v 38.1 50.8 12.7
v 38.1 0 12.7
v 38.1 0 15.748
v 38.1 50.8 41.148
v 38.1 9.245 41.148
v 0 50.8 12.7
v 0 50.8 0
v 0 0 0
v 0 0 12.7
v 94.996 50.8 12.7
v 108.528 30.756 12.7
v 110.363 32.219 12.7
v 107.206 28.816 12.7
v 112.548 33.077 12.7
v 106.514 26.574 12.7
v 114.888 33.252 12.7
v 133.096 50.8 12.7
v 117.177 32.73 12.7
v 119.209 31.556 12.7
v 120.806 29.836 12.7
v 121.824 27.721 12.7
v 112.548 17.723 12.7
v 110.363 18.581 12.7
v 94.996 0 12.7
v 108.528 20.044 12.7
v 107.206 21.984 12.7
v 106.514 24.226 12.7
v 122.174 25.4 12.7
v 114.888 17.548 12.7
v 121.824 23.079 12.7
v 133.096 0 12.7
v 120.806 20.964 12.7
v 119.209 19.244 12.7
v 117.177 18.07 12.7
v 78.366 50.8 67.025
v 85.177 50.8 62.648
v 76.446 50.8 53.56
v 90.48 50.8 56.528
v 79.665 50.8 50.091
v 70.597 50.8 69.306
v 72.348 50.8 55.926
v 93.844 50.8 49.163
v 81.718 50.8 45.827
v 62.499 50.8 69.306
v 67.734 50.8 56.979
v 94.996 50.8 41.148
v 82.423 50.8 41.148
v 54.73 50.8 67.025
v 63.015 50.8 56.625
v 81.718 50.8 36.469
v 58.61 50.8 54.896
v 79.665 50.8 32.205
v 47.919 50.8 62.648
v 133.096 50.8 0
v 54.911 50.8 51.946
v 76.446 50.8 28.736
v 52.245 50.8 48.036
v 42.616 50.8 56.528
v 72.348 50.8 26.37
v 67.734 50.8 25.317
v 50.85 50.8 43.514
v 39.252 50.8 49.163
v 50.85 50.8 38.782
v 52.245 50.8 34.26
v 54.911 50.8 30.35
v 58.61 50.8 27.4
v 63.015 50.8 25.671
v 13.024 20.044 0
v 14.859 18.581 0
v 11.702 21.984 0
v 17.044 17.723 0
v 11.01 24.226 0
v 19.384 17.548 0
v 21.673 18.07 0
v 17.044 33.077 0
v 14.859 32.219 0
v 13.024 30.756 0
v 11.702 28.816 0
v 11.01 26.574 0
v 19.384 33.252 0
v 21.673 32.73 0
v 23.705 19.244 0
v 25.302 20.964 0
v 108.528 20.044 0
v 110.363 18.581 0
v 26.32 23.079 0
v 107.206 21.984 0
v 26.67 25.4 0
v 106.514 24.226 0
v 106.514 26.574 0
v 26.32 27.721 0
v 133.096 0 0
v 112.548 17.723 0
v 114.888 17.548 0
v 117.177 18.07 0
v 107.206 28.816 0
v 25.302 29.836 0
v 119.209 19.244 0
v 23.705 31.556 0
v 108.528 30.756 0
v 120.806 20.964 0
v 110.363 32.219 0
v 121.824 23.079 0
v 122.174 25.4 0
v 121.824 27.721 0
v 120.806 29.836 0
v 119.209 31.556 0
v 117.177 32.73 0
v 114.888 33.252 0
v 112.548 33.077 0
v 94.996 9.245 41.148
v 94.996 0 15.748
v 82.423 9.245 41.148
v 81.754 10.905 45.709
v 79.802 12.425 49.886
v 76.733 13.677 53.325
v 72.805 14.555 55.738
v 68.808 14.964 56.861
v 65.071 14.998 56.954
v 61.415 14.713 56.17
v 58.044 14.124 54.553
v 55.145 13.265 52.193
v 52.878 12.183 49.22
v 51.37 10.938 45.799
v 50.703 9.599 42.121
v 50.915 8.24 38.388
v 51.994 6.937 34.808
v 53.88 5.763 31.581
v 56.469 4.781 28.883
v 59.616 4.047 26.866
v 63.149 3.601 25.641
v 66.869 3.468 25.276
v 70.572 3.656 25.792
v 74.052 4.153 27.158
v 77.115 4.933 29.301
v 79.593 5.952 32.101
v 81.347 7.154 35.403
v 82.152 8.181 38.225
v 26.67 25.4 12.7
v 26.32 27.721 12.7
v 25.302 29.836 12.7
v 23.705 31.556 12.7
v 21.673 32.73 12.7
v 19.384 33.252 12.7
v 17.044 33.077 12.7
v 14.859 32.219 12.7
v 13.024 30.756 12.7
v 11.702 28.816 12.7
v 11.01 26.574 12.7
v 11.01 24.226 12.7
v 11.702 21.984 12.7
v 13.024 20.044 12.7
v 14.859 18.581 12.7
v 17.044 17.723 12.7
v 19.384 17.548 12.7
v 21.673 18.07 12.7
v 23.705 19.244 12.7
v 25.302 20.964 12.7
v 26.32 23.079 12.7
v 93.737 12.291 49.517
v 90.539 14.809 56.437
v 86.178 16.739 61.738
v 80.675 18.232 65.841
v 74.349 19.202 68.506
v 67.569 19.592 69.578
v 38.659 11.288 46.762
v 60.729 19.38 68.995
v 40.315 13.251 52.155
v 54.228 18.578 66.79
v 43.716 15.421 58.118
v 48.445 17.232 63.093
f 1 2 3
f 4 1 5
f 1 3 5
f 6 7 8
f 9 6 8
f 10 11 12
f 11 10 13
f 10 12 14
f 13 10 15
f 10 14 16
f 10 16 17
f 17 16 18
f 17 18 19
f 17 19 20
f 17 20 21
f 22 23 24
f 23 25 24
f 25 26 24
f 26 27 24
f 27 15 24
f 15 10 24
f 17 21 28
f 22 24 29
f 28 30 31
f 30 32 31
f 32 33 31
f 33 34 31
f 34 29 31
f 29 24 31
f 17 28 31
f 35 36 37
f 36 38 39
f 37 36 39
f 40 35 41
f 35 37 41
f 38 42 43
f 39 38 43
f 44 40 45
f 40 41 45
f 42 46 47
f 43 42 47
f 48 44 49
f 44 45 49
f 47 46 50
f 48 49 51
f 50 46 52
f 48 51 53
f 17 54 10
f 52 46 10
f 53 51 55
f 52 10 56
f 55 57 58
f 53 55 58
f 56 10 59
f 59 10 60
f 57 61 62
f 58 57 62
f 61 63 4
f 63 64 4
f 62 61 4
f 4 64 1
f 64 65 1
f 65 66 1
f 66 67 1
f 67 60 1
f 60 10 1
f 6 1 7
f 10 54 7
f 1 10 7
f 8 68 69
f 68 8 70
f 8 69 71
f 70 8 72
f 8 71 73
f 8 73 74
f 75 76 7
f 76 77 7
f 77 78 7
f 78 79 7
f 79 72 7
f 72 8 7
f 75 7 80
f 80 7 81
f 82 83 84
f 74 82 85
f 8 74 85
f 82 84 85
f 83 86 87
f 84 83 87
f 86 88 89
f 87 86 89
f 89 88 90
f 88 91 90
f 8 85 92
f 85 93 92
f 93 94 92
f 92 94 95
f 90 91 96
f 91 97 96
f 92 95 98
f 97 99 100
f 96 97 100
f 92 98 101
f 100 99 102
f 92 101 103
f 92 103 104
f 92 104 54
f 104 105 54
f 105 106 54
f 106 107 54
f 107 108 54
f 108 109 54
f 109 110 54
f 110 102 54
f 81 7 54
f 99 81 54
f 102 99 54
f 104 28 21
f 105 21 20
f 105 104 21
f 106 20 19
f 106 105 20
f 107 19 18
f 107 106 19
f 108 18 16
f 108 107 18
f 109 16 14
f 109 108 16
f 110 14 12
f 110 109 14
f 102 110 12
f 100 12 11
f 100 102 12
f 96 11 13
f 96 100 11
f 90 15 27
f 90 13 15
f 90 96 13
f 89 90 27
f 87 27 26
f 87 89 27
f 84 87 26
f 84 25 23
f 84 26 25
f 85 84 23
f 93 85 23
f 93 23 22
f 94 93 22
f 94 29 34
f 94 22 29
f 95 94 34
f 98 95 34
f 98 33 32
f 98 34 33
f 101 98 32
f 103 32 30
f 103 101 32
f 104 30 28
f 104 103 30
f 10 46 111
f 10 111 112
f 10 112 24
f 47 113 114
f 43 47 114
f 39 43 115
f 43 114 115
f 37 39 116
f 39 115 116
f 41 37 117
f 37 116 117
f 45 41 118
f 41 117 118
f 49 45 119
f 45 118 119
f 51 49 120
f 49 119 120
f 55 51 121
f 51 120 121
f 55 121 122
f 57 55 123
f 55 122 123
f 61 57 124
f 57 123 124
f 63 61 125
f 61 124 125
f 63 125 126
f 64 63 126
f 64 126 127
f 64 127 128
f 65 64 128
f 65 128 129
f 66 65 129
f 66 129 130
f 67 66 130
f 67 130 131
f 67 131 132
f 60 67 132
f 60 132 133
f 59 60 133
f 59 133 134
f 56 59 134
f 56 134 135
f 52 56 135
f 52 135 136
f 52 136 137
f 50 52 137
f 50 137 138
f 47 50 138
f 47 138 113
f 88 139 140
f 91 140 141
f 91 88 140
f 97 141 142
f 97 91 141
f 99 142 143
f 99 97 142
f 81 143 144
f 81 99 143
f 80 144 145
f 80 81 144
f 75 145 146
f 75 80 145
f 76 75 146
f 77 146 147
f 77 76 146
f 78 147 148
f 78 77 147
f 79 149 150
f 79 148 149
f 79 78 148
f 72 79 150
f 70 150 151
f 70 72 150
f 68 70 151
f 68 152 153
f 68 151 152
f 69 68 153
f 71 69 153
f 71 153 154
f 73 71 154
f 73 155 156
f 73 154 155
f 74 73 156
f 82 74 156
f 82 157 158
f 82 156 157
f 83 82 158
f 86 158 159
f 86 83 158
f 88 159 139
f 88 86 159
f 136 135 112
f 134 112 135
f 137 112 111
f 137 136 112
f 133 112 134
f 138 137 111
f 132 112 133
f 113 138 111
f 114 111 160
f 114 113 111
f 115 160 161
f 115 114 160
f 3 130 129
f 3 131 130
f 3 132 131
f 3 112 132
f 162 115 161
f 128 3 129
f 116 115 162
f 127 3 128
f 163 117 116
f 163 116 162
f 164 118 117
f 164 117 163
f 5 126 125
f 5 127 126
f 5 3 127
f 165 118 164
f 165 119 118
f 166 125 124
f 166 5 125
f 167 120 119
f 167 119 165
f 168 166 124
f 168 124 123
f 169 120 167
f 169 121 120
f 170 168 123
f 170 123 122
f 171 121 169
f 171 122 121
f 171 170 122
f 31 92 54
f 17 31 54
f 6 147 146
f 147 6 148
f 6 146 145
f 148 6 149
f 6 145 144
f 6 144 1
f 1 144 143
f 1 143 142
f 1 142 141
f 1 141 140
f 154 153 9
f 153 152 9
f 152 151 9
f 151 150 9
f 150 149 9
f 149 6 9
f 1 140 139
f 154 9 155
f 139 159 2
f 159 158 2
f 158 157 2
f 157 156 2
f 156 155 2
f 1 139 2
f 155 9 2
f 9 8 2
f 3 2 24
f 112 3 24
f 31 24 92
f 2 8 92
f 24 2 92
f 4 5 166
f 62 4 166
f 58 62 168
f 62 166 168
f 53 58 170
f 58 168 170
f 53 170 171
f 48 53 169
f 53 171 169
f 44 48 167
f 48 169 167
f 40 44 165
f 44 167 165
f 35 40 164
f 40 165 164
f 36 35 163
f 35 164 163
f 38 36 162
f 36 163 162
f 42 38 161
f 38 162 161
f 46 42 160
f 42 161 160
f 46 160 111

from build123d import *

# Parameters (mm, degrees)
F0_R     = 7.874
F1_DEPTH = 152.4
F2_R     = 15.875
F3_DEPTH = 173.736
F5_DEPTH = 186.436


with BuildPart() as f1:
    # F0 (on Top) → F1 (new body)
    with BuildSketch(Plane.XY):
        Polygon((0, 50.8), (0, 0), (133.096, 0), (133.096, 50.8), (66.548, 50.8), align=None)
        with Locations((18.796, 25.4)):
            Circle(F0_R, mode=Mode.SUBTRACT)
        with Locations((114.3, 25.4)):
            Circle(F0_R, mode=Mode.SUBTRACT)
    extrude(amount=F1_DEPTH)

    # F2 (on face) → F3 (cut)
    with BuildSketch(Plane.XZ):
        with BuildLine():
            Line((0, 152.4), (0, 12.7))
            Line((0, 12.7), (38.1, 12.7))
            Line((38.1, 12.7), (38.1, 15.748))
            Line((38.1, 15.748), (38.1, 41.148))
            ThreePointArc((38.1, 41.148), (66.548, 69.596), (94.996, 41.148))
            Line((94.996, 41.148), (94.996, 15.748))
            Line((94.996, 15.748), (94.996, 12.7))
            Line((94.996, 12.7), (133.096, 12.7))
            Line((133.096, 12.7), (133.096, 152.4))
            Line((133.096, 152.4), (0, 152.4))
        make_face()
        with Locations((66.548, 41.148)):
            Circle(F2_R)
    extrude(amount=-F3_DEPTH, mode=Mode.SUBTRACT)

    # F4 (on Right) → F5 (cut)
    with BuildSketch(Plane.YZ):
        Polygon((0, 77.27585), (0, 15.748), (22.439078, 77.39886), align=None)
    extrude(amount=F5_DEPTH, mode=Mode.SUBTRACT)


solid = f1.part
